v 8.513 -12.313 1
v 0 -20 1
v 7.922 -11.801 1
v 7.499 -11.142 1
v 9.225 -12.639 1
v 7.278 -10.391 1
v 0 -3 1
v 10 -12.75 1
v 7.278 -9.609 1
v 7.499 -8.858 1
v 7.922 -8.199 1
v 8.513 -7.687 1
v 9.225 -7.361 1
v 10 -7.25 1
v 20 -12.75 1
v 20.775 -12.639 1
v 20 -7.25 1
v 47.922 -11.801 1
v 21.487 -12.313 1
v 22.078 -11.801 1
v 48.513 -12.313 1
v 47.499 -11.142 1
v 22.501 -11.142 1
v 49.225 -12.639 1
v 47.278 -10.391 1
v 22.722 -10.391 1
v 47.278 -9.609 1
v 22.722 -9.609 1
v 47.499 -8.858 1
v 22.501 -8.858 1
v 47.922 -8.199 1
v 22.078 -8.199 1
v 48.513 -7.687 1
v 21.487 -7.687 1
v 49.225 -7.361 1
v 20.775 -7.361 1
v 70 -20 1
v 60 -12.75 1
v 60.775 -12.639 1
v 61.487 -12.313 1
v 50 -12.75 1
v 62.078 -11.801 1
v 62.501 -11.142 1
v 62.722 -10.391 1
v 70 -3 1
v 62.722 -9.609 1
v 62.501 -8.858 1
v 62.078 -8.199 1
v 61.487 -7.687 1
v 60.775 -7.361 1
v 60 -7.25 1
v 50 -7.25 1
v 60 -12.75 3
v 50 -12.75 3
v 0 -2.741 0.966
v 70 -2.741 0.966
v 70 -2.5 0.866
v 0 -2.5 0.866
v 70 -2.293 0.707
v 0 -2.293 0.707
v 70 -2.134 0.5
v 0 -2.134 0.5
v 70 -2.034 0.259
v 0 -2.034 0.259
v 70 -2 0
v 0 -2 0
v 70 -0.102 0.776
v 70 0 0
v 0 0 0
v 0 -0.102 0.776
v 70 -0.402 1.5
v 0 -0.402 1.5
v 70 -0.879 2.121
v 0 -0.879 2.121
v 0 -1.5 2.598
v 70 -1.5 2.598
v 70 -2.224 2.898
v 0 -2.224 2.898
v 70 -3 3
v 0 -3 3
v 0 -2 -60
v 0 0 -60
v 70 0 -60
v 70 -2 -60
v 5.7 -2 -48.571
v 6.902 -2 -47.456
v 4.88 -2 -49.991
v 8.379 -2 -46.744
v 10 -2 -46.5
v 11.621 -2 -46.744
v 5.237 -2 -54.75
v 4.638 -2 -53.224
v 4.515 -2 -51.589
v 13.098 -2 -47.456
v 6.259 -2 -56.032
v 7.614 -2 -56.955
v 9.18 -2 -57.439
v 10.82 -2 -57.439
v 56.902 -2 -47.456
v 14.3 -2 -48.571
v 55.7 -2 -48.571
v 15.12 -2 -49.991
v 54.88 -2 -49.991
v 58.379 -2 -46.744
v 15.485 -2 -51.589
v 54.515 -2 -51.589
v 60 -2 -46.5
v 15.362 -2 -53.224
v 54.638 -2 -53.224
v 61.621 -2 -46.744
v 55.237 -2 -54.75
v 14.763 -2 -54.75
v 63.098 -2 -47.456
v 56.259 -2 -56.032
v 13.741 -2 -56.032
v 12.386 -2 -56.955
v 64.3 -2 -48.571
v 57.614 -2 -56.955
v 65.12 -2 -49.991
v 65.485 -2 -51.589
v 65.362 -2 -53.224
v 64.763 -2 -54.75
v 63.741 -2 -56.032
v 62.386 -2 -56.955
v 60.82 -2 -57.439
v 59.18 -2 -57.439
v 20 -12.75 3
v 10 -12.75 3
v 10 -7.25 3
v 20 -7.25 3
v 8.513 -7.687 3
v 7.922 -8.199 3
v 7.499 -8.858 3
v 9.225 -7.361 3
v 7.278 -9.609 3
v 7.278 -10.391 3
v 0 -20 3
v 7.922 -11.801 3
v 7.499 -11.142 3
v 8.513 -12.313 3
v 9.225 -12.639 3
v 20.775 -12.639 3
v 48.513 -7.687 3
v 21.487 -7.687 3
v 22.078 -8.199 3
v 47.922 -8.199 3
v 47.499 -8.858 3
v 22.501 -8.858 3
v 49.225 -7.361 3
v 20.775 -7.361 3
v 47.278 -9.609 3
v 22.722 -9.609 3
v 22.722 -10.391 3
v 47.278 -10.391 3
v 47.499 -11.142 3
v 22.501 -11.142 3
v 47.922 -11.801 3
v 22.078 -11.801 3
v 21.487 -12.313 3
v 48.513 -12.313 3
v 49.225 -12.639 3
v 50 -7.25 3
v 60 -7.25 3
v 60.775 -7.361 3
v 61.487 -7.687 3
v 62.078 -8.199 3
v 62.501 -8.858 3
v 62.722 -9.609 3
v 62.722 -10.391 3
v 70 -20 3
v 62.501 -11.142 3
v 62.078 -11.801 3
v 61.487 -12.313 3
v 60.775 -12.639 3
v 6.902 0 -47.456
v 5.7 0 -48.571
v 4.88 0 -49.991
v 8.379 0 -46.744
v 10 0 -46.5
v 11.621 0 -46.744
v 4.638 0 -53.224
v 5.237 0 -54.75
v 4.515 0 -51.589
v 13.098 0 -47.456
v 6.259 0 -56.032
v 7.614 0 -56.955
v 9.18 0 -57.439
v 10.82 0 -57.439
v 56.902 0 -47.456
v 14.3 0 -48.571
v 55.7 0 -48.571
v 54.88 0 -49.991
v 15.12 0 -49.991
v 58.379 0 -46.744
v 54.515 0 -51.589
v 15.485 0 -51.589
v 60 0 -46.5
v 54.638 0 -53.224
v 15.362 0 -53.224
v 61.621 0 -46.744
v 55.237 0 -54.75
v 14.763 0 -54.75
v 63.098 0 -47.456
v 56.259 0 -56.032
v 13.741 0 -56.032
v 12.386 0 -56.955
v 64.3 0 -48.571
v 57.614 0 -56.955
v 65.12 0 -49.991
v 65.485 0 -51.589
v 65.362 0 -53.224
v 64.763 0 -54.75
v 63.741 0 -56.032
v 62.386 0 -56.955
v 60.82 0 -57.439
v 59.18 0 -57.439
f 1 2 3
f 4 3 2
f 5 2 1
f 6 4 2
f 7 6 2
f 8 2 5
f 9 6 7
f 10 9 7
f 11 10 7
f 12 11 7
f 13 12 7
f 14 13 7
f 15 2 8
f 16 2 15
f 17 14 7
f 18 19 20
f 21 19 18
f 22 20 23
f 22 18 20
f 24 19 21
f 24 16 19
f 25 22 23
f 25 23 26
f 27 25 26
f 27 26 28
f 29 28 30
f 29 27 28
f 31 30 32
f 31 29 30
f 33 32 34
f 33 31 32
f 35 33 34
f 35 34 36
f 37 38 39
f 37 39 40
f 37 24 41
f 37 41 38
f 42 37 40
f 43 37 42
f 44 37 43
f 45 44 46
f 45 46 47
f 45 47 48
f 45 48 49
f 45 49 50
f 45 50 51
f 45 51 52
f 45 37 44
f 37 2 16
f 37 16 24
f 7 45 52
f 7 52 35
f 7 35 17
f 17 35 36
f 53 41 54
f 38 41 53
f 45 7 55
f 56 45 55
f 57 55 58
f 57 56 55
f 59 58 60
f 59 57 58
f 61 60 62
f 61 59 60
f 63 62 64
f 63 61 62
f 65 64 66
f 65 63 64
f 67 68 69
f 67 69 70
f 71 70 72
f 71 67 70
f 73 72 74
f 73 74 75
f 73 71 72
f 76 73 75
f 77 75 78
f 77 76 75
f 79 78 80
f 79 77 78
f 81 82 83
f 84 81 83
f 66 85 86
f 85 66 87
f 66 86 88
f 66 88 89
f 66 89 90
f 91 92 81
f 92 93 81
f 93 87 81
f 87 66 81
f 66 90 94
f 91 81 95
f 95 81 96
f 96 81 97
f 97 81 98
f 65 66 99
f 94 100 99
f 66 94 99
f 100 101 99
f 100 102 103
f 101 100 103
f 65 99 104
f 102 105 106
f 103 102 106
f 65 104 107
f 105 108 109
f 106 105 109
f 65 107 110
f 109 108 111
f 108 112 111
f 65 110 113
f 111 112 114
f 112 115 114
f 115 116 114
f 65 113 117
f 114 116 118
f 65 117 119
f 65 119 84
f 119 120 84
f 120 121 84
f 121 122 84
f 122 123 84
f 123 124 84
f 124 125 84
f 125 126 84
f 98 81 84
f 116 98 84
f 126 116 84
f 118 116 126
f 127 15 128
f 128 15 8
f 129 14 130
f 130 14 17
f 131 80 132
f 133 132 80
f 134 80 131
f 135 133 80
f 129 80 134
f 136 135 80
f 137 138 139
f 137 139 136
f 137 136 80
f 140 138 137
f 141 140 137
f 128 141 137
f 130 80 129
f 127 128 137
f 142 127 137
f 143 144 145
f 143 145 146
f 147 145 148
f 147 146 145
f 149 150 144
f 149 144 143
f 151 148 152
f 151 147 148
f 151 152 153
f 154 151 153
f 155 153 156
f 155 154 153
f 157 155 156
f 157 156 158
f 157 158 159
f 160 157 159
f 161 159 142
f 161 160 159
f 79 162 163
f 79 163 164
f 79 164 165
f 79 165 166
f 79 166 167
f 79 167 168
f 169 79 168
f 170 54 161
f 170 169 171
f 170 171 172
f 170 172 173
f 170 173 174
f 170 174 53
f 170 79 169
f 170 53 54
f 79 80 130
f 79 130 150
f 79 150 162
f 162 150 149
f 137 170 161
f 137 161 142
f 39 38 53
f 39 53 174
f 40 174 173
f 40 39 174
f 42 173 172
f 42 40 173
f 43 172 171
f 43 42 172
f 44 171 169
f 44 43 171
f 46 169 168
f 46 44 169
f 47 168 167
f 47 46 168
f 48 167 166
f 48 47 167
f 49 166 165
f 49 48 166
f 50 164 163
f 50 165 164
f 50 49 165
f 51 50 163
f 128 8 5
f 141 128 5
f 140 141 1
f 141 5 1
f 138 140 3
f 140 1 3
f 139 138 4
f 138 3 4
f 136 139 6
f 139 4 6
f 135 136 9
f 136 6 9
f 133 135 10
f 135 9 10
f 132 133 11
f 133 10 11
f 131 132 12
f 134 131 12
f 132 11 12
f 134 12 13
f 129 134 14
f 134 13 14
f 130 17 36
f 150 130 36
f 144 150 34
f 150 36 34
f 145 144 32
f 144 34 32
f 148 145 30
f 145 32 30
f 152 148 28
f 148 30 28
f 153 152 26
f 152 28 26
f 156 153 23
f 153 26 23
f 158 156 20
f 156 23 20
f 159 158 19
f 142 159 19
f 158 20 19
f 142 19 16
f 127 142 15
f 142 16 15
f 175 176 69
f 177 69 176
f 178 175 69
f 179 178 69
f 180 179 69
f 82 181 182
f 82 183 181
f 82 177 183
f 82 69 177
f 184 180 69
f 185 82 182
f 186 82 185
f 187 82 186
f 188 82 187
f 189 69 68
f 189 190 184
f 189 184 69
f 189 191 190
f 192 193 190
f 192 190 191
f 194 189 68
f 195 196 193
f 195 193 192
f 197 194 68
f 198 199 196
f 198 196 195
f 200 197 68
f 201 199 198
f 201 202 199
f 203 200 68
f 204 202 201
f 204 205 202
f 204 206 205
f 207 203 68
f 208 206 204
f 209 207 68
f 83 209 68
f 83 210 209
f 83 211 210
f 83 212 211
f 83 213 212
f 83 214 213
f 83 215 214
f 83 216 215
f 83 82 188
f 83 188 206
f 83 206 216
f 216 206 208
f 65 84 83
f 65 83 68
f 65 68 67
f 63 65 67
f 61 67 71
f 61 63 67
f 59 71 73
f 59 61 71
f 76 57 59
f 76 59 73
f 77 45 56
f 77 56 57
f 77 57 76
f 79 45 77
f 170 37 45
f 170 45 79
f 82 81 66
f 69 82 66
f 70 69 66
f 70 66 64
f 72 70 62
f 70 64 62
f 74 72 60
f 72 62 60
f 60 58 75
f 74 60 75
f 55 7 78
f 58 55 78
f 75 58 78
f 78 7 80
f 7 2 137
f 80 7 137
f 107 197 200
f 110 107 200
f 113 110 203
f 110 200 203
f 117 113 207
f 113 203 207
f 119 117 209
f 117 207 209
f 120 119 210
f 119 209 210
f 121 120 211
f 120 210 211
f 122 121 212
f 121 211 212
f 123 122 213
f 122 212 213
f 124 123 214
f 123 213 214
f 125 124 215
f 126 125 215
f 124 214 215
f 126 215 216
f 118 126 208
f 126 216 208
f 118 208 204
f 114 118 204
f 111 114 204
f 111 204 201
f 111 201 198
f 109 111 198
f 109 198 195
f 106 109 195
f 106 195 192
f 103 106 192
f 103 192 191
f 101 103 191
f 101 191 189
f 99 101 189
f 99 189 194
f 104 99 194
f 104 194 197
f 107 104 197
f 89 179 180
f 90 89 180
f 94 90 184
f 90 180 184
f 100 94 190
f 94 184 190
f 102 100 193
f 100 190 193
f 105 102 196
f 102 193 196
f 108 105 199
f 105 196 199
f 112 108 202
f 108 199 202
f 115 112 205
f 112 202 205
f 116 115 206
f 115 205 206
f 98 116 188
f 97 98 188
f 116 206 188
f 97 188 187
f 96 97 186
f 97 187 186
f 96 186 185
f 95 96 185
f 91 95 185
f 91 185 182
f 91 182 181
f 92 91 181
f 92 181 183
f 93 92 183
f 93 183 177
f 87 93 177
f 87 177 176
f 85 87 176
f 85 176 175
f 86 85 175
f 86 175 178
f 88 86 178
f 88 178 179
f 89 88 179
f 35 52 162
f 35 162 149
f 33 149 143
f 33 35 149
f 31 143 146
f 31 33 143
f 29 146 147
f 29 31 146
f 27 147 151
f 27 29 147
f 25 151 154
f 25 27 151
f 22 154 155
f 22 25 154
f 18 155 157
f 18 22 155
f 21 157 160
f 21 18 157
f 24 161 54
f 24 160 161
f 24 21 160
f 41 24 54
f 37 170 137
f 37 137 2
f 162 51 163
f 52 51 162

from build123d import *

# Parameters (mm, degrees)
SKETCH_1_W             = 70
SKETCH_1_H             = 60
SM_BASE_FLANGE_1_DEPTH = 2
SM_EDGE_FLANGE_1_DEPTH = 70
CUT_EXTRUDE_1_DEPTH    = 10
SKETCH_13_R            = 5.5
CUT_EXTRUDE_2_DEPTH    = 10


# Sheet-metal steps are written as plain solids
with BuildPart() as part:
    # Sketch 1 → 基体-法兰1 (new body)
    with BuildSketch(Plane(origin=(0, 0, 0), x_dir=(1, 0, 0), z_dir=(0, 1, 0))):
        with Locations((35, 30)):
            Rectangle(SKETCH_1_W, SKETCH_1_H)
    extrude(amount=-SM_BASE_FLANGE_1_DEPTH)

    # 边线-法兰1 section (across the edge) → 边线-法兰1 (add)
    with BuildSketch(Plane(origin=(70, -2, 1), x_dir=(0, 0, -1), z_dir=(-1, 0, 0))):
        with BuildLine():
            Line((-2, 1), (-2, 18))
            Line((-2, 18), (0, 18))
            Line((0, 18), (0, 1))
            ThreePointArc((0, 1), (0.292893219, 0.292893219), (1, 0))
            Line((1, 0), (1, -2))
            ThreePointArc((1, -2), (-1.121320344, -1.121320344), (-2, 1))
        make_face()
    extrude(amount=SM_EDGE_FLANGE_1_DEPTH)

    # 草图12 → 切除-拉伸1 (cut)
    with BuildSketch(Plane(origin=(0, 0, 1), x_dir=(-1, 0, 0), z_dir=(0, 0, -1))):
        with BuildLine():
            Line((-60, -7.25), (-50, -7.25))
            ThreePointArc((-50, -7.25), (-47.25, -10), (-50, -12.75))
            Line((-50, -12.75), (-60, -12.75))
            ThreePointArc((-60, -12.75), (-62.75, -10), (-60, -7.25))
        make_face()
        with BuildLine():
            Line((-10, -7.25), (-20, -7.25))
            ThreePointArc((-20, -7.25), (-22.75, -10), (-20, -12.75))
            Line((-20, -12.75), (-10, -12.75))
            ThreePointArc((-10, -12.75), (-7.25, -10), (-10, -7.25))
        make_face()
    extrude(amount=-CUT_EXTRUDE_1_DEPTH, mode=Mode.SUBTRACT)

    # 草图13 → 切除-拉伸2 (cut)
    with BuildSketch(Plane(origin=(0, 0, 0), x_dir=(1, 0, 0), z_dir=(0, 1, 0))):
        with Locations(Location((10, 52, 0), (0, 0, 270))):
            Circle(SKETCH_13_R)
        with Locations(Location((60, 52, 0), (0, 0, 270))):
            Circle(SKETCH_13_R)
    extrude(amount=-CUT_EXTRUDE_2_DEPTH, mode=Mode.SUBTRACT)


solid = part.part
